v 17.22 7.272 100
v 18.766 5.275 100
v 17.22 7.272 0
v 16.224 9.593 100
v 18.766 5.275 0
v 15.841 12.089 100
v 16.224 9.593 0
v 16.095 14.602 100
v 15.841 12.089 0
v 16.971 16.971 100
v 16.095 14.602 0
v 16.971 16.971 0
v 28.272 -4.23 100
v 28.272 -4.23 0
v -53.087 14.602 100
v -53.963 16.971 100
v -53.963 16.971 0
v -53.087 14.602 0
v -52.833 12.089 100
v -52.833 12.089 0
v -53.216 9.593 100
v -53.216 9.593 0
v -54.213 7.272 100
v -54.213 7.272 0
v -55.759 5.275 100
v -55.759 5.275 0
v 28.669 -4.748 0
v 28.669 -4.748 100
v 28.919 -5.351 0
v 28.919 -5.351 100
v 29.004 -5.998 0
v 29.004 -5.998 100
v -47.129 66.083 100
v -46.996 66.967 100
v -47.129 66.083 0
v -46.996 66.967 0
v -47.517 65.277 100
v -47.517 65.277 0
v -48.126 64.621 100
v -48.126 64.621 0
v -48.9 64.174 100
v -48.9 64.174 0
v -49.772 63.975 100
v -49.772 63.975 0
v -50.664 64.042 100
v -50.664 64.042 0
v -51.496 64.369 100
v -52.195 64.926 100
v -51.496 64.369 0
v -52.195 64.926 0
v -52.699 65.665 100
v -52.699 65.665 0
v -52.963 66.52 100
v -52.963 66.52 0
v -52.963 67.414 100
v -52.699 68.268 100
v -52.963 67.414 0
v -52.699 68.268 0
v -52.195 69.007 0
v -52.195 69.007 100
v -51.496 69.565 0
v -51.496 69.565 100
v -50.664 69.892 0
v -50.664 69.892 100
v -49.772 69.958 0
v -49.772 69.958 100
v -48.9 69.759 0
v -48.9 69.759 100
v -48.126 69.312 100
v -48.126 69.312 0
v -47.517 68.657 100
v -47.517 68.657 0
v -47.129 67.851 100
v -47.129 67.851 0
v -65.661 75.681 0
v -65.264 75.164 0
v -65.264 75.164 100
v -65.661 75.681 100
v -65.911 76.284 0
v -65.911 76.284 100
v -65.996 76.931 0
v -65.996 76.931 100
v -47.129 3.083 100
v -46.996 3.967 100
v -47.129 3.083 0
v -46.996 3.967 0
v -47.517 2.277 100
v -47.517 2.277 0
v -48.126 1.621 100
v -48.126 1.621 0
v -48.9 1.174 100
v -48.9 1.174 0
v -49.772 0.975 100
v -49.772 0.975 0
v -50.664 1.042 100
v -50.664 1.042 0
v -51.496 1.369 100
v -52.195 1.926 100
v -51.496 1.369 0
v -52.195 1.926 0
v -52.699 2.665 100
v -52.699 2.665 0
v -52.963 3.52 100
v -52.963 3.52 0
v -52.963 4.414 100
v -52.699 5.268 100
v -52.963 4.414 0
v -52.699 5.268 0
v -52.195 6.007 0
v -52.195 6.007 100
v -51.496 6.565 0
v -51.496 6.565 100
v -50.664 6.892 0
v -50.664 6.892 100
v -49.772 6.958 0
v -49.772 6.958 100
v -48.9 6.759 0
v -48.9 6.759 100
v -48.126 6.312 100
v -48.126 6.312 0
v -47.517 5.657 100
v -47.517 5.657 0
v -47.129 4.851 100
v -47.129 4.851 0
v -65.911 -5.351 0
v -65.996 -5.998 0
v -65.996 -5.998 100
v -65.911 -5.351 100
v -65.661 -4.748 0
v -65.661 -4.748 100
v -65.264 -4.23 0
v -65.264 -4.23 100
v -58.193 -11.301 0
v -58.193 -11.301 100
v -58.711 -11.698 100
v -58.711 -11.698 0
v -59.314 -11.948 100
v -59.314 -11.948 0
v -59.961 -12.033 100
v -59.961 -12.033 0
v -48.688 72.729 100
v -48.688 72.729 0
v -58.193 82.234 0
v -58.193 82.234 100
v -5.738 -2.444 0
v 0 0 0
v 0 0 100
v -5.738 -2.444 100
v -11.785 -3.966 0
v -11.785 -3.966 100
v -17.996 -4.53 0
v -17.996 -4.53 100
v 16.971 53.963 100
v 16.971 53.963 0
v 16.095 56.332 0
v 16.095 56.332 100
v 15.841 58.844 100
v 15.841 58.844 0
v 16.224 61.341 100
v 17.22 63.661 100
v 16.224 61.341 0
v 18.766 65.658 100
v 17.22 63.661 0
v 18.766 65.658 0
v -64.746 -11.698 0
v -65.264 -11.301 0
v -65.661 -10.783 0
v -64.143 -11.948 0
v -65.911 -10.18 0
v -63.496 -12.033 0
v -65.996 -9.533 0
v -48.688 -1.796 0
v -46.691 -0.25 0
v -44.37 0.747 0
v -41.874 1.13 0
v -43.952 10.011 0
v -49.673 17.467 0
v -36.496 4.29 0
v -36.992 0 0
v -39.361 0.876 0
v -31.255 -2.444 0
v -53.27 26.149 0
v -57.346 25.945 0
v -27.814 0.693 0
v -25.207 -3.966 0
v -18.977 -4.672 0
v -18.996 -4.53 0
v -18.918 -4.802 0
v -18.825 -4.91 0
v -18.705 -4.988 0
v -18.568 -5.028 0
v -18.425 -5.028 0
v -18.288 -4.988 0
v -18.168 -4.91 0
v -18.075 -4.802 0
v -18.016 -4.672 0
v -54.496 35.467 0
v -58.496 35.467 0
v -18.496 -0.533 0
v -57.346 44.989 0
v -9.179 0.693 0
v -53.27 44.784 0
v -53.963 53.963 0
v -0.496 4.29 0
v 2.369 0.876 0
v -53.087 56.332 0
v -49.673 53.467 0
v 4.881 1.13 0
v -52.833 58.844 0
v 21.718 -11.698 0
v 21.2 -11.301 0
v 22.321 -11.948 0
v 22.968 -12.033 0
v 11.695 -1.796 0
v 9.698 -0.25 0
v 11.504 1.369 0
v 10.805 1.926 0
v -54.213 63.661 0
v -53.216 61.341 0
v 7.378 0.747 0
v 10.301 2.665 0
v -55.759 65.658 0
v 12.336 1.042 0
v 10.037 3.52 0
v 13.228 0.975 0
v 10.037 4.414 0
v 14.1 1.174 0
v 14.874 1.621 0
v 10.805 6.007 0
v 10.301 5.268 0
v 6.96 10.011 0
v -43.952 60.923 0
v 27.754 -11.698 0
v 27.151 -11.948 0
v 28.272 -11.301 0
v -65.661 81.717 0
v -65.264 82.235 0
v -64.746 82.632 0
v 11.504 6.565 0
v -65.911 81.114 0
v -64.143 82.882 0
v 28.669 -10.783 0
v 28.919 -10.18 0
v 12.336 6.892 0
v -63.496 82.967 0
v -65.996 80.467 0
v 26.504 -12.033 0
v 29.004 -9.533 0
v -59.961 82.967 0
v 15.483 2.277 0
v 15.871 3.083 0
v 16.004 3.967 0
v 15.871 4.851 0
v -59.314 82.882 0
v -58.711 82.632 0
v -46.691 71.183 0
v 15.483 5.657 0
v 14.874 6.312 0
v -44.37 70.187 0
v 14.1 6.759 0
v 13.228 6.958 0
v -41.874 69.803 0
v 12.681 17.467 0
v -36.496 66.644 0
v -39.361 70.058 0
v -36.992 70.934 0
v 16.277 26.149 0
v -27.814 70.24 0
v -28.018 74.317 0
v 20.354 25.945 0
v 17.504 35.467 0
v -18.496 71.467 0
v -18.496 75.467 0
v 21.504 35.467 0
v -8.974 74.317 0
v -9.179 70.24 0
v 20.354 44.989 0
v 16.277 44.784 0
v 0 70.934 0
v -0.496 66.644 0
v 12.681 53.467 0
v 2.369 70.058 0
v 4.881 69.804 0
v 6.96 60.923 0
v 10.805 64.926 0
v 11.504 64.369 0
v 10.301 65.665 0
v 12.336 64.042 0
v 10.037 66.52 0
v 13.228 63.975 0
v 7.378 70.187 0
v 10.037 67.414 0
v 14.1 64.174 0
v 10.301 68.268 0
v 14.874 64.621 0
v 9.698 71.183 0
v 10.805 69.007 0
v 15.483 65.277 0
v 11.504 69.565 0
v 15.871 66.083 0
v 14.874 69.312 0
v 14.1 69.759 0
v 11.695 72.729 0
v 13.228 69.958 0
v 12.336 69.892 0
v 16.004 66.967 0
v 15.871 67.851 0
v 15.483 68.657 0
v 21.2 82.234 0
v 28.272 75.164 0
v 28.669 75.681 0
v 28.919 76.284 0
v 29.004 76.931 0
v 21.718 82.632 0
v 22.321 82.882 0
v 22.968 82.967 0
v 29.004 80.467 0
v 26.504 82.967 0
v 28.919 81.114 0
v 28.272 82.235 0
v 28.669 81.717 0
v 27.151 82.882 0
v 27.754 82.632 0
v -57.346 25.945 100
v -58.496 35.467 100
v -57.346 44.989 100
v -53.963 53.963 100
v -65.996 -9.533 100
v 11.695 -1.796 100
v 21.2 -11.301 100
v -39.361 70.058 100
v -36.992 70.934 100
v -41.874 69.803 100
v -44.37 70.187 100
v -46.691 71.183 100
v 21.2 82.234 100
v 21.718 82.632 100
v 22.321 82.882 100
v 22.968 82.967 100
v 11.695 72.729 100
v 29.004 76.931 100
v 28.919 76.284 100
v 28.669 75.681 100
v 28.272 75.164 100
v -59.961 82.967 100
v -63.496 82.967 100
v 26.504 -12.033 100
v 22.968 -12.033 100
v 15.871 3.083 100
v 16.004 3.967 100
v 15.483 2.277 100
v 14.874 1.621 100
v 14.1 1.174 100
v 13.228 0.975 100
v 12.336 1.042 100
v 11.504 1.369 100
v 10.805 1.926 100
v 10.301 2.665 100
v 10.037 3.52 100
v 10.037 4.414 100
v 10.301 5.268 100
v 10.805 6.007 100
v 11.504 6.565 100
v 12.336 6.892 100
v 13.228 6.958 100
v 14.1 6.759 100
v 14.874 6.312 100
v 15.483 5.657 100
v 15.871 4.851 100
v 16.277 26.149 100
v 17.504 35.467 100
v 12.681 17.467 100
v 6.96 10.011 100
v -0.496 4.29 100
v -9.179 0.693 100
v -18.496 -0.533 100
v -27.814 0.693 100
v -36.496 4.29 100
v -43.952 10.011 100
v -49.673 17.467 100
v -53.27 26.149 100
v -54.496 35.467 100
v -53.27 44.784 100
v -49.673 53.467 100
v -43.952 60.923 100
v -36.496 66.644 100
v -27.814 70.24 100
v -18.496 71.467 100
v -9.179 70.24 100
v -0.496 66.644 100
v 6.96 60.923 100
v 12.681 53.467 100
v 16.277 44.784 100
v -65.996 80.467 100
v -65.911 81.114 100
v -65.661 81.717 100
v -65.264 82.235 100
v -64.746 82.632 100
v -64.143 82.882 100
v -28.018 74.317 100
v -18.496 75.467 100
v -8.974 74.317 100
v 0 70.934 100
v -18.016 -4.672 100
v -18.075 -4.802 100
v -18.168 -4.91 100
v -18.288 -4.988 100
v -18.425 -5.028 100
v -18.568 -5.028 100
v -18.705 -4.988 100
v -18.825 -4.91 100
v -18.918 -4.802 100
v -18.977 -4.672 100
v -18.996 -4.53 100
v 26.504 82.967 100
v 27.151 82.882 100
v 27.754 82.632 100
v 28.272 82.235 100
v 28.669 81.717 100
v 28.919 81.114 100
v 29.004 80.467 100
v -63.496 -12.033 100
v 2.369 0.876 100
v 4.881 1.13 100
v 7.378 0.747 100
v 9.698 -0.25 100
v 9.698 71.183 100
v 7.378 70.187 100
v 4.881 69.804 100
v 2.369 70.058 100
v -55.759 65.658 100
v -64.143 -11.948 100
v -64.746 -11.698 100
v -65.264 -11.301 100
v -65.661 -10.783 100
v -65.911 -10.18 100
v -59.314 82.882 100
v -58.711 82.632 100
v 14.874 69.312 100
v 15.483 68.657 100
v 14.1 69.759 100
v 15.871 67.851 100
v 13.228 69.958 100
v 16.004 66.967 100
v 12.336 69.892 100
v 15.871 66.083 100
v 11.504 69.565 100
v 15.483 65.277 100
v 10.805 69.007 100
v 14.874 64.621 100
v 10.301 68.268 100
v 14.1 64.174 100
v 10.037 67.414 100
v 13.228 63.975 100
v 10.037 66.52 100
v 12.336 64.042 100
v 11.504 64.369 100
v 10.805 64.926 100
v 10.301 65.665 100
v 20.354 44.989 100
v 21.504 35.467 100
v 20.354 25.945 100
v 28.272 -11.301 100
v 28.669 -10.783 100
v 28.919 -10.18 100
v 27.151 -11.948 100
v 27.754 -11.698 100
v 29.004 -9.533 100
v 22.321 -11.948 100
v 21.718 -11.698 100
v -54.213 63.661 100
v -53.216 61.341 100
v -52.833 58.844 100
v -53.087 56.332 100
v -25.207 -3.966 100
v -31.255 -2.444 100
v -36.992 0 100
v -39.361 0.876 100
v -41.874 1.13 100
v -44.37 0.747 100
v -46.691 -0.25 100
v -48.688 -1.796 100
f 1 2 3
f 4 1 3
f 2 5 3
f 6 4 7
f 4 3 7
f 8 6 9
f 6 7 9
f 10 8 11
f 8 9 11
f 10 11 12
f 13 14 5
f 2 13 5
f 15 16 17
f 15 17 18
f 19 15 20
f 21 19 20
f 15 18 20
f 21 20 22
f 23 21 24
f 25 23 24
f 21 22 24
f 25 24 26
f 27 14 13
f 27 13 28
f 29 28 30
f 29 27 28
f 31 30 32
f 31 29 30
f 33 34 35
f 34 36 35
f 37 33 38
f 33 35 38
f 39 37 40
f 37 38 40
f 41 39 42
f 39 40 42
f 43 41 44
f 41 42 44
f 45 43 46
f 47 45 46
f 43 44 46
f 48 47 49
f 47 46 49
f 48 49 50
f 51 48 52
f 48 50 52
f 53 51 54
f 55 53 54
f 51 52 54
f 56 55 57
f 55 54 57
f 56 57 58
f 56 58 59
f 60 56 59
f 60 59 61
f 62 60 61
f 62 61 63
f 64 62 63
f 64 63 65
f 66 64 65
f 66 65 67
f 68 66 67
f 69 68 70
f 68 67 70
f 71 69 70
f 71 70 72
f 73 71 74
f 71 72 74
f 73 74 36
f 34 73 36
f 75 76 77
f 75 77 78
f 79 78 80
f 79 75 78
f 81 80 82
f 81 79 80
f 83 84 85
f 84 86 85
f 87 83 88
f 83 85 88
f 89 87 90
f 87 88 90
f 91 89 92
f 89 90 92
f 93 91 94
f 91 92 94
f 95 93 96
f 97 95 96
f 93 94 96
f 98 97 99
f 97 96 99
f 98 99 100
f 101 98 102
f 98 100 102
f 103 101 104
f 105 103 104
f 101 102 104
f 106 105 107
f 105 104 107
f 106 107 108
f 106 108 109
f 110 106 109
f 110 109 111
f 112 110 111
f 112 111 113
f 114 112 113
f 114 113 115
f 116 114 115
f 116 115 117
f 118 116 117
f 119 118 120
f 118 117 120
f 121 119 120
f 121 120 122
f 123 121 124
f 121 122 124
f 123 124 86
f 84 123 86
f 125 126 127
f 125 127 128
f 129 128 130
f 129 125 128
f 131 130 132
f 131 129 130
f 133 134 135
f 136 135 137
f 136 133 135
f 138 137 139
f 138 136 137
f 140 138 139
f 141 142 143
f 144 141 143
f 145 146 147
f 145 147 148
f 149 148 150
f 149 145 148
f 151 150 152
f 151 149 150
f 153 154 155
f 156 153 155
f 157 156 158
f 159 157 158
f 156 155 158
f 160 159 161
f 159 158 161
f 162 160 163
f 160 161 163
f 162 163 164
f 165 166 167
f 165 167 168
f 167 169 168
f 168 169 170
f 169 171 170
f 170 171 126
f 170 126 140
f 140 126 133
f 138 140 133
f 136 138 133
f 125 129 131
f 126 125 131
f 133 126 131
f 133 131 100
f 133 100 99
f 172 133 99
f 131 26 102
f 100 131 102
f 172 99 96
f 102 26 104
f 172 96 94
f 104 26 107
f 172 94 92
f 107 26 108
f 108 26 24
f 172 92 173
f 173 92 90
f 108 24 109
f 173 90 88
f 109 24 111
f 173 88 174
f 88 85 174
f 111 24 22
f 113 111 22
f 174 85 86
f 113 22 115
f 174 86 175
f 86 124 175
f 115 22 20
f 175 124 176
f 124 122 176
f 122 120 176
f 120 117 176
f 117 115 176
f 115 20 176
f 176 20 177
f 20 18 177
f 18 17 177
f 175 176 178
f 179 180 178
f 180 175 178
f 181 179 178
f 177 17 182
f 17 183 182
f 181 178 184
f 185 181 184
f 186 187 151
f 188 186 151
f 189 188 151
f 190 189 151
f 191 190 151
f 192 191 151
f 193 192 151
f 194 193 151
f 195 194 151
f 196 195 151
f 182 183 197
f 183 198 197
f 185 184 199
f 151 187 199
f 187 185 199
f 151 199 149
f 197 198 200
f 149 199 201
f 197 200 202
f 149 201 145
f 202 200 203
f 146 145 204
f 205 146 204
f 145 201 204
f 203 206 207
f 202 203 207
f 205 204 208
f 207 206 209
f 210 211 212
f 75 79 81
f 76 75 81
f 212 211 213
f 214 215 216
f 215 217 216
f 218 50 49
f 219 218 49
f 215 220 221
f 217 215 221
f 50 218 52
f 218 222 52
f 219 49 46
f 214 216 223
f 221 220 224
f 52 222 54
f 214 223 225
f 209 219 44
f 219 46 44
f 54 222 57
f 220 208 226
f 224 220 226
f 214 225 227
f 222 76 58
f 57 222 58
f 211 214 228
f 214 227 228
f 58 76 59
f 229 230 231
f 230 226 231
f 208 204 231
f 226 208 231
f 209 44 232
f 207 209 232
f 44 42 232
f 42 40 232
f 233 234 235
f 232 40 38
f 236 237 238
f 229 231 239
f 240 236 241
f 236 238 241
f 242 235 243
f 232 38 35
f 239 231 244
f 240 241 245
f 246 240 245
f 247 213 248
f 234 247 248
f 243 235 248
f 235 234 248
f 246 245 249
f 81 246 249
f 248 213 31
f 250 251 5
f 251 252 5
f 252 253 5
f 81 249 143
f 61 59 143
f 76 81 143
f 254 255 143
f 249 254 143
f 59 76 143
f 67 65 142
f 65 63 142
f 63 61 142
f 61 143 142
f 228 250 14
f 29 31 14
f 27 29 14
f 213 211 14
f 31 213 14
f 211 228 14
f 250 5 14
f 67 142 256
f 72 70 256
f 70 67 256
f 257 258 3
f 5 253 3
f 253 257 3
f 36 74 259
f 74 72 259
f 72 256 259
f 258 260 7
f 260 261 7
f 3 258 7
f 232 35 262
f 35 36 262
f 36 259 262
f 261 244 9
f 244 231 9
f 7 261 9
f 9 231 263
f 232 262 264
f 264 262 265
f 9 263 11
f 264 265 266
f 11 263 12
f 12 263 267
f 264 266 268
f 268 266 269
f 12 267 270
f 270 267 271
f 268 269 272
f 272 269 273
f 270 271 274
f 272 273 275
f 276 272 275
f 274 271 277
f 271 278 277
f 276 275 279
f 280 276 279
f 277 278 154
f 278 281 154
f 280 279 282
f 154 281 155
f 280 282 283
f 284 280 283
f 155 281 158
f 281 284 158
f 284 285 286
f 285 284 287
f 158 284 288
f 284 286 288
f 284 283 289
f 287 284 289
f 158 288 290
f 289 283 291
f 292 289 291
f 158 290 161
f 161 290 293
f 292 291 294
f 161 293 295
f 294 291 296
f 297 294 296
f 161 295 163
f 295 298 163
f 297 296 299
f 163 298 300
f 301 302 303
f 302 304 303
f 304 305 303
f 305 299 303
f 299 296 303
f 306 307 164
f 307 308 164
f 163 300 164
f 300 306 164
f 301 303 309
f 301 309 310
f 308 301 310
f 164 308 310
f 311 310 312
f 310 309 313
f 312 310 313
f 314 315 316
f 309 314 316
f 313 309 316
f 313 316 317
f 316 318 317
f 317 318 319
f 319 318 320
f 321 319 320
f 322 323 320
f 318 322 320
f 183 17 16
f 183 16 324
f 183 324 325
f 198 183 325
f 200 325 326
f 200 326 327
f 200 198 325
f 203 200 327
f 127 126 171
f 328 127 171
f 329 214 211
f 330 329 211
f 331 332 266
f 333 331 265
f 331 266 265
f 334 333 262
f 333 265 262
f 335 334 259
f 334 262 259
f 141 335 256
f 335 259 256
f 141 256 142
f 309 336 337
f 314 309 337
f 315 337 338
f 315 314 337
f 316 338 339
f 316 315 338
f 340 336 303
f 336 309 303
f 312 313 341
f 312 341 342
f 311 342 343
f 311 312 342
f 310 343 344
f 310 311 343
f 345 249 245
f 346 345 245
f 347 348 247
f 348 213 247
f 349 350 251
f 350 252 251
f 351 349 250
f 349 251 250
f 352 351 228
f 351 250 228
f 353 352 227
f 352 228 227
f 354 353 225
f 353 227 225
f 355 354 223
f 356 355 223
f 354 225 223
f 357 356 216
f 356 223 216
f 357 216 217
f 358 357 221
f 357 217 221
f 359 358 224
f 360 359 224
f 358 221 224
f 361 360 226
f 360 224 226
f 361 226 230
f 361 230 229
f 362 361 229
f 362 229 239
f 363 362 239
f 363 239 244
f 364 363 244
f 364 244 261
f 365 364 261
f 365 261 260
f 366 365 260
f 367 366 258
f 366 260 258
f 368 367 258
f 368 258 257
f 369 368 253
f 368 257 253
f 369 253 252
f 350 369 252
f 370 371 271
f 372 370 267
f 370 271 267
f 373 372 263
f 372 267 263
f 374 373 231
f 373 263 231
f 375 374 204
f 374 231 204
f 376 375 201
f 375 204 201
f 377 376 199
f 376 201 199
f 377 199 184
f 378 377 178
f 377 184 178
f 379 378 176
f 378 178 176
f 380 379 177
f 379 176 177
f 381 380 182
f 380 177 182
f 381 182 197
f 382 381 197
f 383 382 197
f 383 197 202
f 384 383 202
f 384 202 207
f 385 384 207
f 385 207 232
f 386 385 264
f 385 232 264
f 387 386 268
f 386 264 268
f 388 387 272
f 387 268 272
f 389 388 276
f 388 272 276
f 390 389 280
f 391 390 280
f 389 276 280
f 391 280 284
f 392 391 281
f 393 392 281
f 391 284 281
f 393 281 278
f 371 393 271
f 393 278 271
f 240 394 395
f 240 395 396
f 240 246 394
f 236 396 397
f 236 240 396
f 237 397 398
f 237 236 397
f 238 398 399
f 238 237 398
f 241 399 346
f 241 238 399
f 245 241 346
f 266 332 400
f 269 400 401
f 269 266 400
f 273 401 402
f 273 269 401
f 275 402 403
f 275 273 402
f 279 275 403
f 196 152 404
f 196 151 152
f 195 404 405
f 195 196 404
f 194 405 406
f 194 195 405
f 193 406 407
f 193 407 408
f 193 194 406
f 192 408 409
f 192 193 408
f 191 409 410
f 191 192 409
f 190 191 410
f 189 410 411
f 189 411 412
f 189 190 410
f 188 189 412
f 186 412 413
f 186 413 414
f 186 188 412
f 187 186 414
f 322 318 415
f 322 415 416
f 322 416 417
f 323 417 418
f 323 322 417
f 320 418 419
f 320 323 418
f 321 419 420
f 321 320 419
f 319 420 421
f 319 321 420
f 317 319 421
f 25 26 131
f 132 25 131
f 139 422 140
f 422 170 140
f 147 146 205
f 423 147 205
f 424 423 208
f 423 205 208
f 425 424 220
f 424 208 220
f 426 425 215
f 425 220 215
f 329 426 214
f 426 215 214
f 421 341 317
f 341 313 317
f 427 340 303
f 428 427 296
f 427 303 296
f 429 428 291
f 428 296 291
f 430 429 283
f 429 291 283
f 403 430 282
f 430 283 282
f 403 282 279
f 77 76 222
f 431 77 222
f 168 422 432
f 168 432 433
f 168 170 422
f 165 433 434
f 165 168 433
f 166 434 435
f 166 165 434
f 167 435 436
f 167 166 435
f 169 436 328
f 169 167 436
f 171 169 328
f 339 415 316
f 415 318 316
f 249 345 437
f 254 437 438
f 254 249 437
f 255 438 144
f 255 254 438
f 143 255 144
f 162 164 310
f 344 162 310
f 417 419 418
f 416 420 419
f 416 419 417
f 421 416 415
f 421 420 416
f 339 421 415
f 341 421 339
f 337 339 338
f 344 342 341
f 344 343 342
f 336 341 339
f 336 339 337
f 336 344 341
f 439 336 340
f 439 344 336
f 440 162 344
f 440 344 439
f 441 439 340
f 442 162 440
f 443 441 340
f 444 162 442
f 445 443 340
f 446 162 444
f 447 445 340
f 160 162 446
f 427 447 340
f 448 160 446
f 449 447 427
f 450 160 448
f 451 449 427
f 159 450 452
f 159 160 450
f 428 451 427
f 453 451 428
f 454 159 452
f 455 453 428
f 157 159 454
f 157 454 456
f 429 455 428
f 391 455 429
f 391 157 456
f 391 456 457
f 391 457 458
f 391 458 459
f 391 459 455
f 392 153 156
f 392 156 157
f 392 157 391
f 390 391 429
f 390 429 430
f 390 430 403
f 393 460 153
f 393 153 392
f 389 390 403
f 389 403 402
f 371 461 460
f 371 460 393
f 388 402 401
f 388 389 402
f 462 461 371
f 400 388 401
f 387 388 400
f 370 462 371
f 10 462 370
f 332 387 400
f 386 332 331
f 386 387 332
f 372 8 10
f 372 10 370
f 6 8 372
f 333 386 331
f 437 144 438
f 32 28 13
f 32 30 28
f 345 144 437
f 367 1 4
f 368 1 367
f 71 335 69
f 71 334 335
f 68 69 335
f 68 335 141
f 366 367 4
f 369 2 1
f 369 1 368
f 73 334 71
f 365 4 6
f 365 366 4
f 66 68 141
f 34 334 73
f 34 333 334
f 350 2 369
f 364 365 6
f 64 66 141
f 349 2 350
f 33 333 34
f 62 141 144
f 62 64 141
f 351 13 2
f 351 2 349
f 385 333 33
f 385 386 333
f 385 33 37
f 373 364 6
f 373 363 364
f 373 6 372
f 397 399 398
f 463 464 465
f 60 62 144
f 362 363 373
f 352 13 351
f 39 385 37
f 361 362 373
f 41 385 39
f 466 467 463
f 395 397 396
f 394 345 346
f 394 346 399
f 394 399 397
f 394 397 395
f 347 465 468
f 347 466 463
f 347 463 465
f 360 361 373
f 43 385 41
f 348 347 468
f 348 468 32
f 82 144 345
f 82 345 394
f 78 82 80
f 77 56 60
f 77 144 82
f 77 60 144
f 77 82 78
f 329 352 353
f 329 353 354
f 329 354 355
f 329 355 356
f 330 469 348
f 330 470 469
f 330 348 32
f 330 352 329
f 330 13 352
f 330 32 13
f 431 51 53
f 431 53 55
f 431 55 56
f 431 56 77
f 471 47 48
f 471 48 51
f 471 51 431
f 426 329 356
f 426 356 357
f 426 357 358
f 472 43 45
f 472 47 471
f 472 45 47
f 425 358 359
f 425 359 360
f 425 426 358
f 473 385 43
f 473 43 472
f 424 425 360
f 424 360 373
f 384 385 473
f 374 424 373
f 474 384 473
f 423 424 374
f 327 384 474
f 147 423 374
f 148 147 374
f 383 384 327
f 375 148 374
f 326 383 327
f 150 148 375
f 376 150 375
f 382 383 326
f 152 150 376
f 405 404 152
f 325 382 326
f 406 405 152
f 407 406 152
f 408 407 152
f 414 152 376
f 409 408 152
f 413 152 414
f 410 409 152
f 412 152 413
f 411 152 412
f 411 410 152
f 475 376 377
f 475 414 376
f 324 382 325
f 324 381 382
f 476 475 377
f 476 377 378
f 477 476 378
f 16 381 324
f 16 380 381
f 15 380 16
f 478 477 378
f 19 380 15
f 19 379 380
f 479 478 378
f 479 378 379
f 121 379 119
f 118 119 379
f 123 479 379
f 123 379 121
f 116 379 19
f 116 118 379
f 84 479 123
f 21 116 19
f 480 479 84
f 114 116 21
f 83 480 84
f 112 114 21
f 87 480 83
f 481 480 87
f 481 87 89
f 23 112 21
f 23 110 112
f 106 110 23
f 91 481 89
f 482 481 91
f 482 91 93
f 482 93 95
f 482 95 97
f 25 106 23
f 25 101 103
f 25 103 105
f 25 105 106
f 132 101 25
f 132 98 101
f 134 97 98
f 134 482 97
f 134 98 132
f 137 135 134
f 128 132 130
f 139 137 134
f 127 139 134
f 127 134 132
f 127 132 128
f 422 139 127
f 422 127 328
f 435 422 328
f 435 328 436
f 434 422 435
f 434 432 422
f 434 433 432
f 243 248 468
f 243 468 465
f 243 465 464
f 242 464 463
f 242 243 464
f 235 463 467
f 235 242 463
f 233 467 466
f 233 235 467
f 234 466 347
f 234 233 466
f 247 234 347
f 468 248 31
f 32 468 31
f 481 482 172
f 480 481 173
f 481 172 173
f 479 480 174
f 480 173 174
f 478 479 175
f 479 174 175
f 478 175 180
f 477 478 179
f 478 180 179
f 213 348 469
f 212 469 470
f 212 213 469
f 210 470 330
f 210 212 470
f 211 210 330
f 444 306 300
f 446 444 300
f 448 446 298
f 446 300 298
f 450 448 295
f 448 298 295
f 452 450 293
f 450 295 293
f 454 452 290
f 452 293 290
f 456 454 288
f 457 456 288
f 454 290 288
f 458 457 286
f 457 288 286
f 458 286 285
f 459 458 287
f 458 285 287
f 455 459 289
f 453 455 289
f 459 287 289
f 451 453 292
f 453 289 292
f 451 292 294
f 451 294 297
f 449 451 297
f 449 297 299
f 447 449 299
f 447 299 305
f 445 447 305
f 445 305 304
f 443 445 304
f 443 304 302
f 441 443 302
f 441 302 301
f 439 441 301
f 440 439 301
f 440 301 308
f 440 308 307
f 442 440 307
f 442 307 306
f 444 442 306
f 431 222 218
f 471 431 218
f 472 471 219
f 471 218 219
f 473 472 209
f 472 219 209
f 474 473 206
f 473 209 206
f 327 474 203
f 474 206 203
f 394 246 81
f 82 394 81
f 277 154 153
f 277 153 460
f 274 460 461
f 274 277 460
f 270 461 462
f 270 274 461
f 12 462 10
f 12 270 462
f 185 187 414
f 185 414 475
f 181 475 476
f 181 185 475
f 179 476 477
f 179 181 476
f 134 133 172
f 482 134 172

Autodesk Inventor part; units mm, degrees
ref_plane "YZ Plane" through (0, 0, 0) normal (1, 0, 0) x (0, 1, 0)
ref_plane "XZ Plane" through (0, 0, 0) normal (0, 1, 0) x (-1, 0, 0)
ref_plane "XY Plane" through (0, 0, 0) normal (0, 0, 1) x (1, 0, 0)
sketch "Sketch1" plane through (0, 0, 0) normal (0, 0, 1) x (1, 0, 0)
  arc A0 (11.6951, -1.7956) -> (0, 0) centre (4.624, -8.8667) ccw
  line L0 (11.6951, -1.7956) -> (21.2005, -11.301)
  arc A1 (21.2005, -11.301) -> (22.9683, -12.0332) centre (22.9683, -9.5332) ccw
  line L1 (22.9683, -12.0332) -> (26.5038, -12.0332)
  arc A2 (26.5038, -12.0332) -> (29.0038, -9.5332) centre (26.5038, -9.5332) ccw
  line L2 (29.0038, -9.5332) -> (29.0038, -5.9977)
  arc A3 (29.0038, -5.9977) -> (28.2716, -4.2299) centre (26.5038, -5.9977) ccw
  line L3 (28.2716, -4.2299) -> (18.7662, 5.2754)
  arc A4 (16.9706, 16.9706) -> (18.7662, 5.2754) centre (25.8373, 12.3465) ccw
  arc A5 (16.9706, 16.9706) -> (16.9706, 53.963) centre (-18.4962, 35.4668) ccw
  arc A6 (18.7662, 65.6581) -> (16.9706, 53.963) centre (25.8373, 58.587) ccw
  line L4 (18.7662, 65.6581) -> (28.2716, 75.1635)
  arc A7 (28.2716, 75.1635) -> (29.0038, 76.9312) centre (26.5038, 76.9312) ccw
  line L5 (29.0038, 76.9312) -> (29.0038, 80.4668)
  arc A8 (29.0038, 80.4668) -> (26.5038, 82.9668) centre (26.5038, 80.4668) ccw
  line L6 (26.5038, 82.9668) -> (22.9683, 82.9668)
  arc A9 (22.9683, 82.9668) -> (21.2005, 82.2345) centre (22.9683, 80.4668) ccw
  line L7 (21.2005, 82.2345) -> (11.6951, 72.7291)
  arc A10 (0, 70.9335) -> (11.6951, 72.7291) centre (4.624, 79.8002) ccw
  arc A11 (0, 70.9335) -> (-36.9924, 70.9335) centre (-18.4962, 35.4668) ccw
  arc A12 (-48.6875, 72.7291) -> (-36.9924, 70.9335) centre (-41.6164, 79.8002) ccw
  line L8 (-48.6875, 72.7291) -> (-58.1929, 82.2345)
  arc A13 (-58.1929, 82.2345) -> (-59.9607, 82.9668) centre (-59.9607, 80.4668) ccw
  line L9 (-59.9607, 82.9668) -> (-63.4962, 82.9668)
  arc A14 (-63.4962, 82.9668) -> (-65.9962, 80.4668) centre (-63.4962, 80.4668) ccw
  line L10 (-65.9962, 80.4668) -> (-65.9962, 76.9312)
  arc A15 (-65.9962, 76.9312) -> (-65.264, 75.1635) centre (-63.4962, 76.9312) ccw
  line L11 (-65.264, 75.1635) -> (-55.7586, 65.6581)
  arc A16 (-53.9629, 53.963) -> (-55.7586, 65.6581) centre (-62.8296, 58.587) ccw
  arc A17 (-53.9629, 53.963) -> (-53.963, 16.9706) centre (-18.4962, 35.4668) ccw
  arc A18 (-55.7586, 5.2754) -> (-53.963, 16.9706) centre (-62.8296, 12.3465) ccw
  line L12 (-55.7586, 5.2754) -> (-65.264, -4.2299)
  arc A19 (-65.264, -4.2299) -> (-65.9962, -5.9977) centre (-63.4962, -5.9977) ccw
  line L13 (-65.9962, -5.9977) -> (-65.9962, -9.5332)
  arc A20 (-65.9962, -9.5332) -> (-63.4962, -12.0332) centre (-63.4962, -9.5332) ccw
  line L14 (-63.4962, -12.0332) -> (-59.9607, -12.0332)
  arc A21 (-59.9607, -12.0332) -> (-58.1929, -11.301) centre (-59.9607, -9.5332) ccw
  line L15 (-58.1929, -11.301) -> (-48.6875, -1.7956)
  arc A22 (-36.9924, 0) -> (-48.6875, -1.7956) centre (-41.6164, -8.8667) ccw
  arc A23 (-36.9924, 0) -> (-18.9962, -4.5301) centre (-18.4962, 35.4668) ccw
  arc A24 (-18.9962, -4.5301) -> (-17.9962, -4.5301) centre (-18.4962, -4.5332) ccw
  arc A25 (-17.9962, -4.5301) -> (0, 0) centre (-18.4962, 35.4668) ccw
  circle A26 centre (-49.9962, 3.9668) radius 3
  circle A27 centre (-49.9962, 66.9668) radius 3
  circle A28 centre (13.0038, 3.9668) radius 3
  circle A29 centre (13.0038, 66.9668) radius 3
  circle A30 centre (-18.4962, 35.4668) radius 36
extrude "Extrusion1" add sketch "Sketch1" along normal blind 400
sketch "Sketch2" plane through (0, 0, 400) normal (0, 0, 1) x (1, 0, 0)
  circle A0 centre (-18.4962, 35.4668) radius 36 projected
  circle A1 centre (13.0038, 66.9668) radius 3 projected
  circle A2 centre (13.0038, 3.9668) radius 3 projected
  circle A3 centre (-49.9962, 66.9668) radius 3 projected
  circle A4 centre (-49.9962, 3.9668) radius 3 projected
  arc A5 (-17.9962, -4.5301) -> (0, 0) centre (-18.4962, 35.4668) ccw projected
  arc A6 (11.6951, -1.7956) -> (0, 0) centre (4.624, -8.8667) ccw projected
  line L0 (21.2005, -11.301) -> (11.6951, -1.7956) projected
  arc A7 (21.2005, -11.301) -> (22.9683, -12.0332) centre (22.9683, -9.5332) ccw projected
  line L1 (26.5038, -12.0332) -> (22.9683, -12.0332) projected
  arc A8 (26.5038, -12.0332) -> (29.0038, -9.5332) centre (26.5038, -9.5332) ccw projected
  line L2 (29.0038, -5.9977) -> (29.0038, -9.5332) projected
  arc A9 (29.0038, -5.9977) -> (28.2716, -4.2299) centre (26.5038, -5.9977) ccw projected
  line L3 (18.7662, 5.2754) -> (28.2716, -4.2299) projected
  arc A10 (16.9706, 16.9706) -> (18.7662, 5.2754) centre (25.8373, 12.3465) ccw projected
  arc A11 (16.9706, 16.9706) -> (16.9706, 53.963) centre (-18.4962, 35.4668) ccw projected
  arc A12 (18.7662, 65.6581) -> (16.9706, 53.963) centre (25.8373, 58.587) ccw projected
  line L4 (28.2716, 75.1635) -> (18.7662, 65.6581) projected
  arc A13 (28.2716, 75.1635) -> (29.0038, 76.9312) centre (26.5038, 76.9312) ccw projected
  line L5 (29.0038, 80.4668) -> (29.0038, 76.9312) projected
  arc A14 (29.0038, 80.4668) -> (26.5038, 82.9668) centre (26.5038, 80.4668) ccw projected
  line L6 (22.9683, 82.9668) -> (26.5038, 82.9668) projected
  arc A15 (22.9683, 82.9668) -> (21.2005, 82.2345) centre (22.9683, 80.4668) ccw projected
  line L7 (11.6951, 72.7291) -> (21.2005, 82.2345) projected
  arc A16 (0, 70.9335) -> (11.6951, 72.7291) centre (4.624, 79.8002) ccw projected
  arc A17 (0, 70.9335) -> (-36.9924, 70.9335) centre (-18.4962, 35.4668) ccw projected
  arc A18 (-48.6875, 72.7291) -> (-36.9924, 70.9335) centre (-41.6164, 79.8002) ccw projected
  line L8 (-58.1929, 82.2345) -> (-48.6875, 72.7291) projected
  arc A19 (-58.1929, 82.2345) -> (-59.9607, 82.9668) centre (-59.9607, 80.4668) ccw projected
  line L9 (-63.4962, 82.9668) -> (-59.9607, 82.9668) projected
  arc A20 (-63.4962, 82.9668) -> (-65.9962, 80.4668) centre (-63.4962, 80.4668) ccw projected
  line L10 (-65.9962, 76.9312) -> (-65.9962, 80.4668) projected
  arc A21 (-65.9962, 76.9312) -> (-65.264, 75.1635) centre (-63.4962, 76.9312) ccw projected
  line L11 (-55.7586, 65.6581) -> (-65.264, 75.1635) projected
  arc A22 (-53.9629, 53.963) -> (-55.7586, 65.6581) centre (-62.8296, 58.587) ccw projected
  arc A23 (-53.9629, 53.963) -> (-53.963, 16.9706) centre (-18.4962, 35.4668) ccw projected
  arc A24 (-55.7586, 5.2754) -> (-53.963, 16.9706) centre (-62.8296, 12.3465) ccw projected
  line L12 (-65.264, -4.2299) -> (-55.7586, 5.2754) projected
  arc A25 (-65.264, -4.2299) -> (-65.9962, -5.9977) centre (-63.4962, -5.9977) ccw projected
  line L13 (-65.9962, -9.5332) -> (-65.9962, -5.9977) projected
  arc A26 (-65.9962, -9.5332) -> (-63.4962, -12.0332) centre (-63.4962, -9.5332) ccw projected
  line L14 (-59.9607, -12.0332) -> (-63.4962, -12.0332) projected
  arc A27 (-59.9607, -12.0332) -> (-58.1929, -11.301) centre (-59.9607, -9.5332) ccw projected
  line L15 (-48.6875, -1.7956) -> (-58.1929, -11.301) projected
  arc A28 (-36.9924, 0) -> (-48.6875, -1.7956) centre (-41.6164, -8.8667) ccw projected
  arc A29 (-36.9924, 0) -> (-18.9962, -4.5301) centre (-18.4962, 35.4668) ccw projected
  arc A30 (-18.9962, -4.5301) -> (-17.9962, -4.5301) centre (-18.4962, -4.5332) ccw projected
extrude "Extrusion2" cut sketch "Sketch2" against normal blind 250
sketch "Sketch3" plane through (-63.4962, -12.0332, 0) normal (0, -1, 0) x (1, 0, 0)
  line L0 (0, 0) -> (0, 150) projected
  line L1 (-3.0046, 150) -> (99.6718, 150)
  line L2 (99.6718, 150) -> (99.6718, 100)
  line L3 (99.6718, 100) -> (-3.0046, 100)
  line L4 (-3.0046, 100) -> (-3.0046, 150)
  point P0 (63.4962, 0)
  dimension "d4" = 50
  dimension "d5" = 102.6763
  dimension "d6" = 3.0046
extrude "Extrusion3" cut sketch "Sketch3" against normal blind 95
properties part number "X95_100mm"
